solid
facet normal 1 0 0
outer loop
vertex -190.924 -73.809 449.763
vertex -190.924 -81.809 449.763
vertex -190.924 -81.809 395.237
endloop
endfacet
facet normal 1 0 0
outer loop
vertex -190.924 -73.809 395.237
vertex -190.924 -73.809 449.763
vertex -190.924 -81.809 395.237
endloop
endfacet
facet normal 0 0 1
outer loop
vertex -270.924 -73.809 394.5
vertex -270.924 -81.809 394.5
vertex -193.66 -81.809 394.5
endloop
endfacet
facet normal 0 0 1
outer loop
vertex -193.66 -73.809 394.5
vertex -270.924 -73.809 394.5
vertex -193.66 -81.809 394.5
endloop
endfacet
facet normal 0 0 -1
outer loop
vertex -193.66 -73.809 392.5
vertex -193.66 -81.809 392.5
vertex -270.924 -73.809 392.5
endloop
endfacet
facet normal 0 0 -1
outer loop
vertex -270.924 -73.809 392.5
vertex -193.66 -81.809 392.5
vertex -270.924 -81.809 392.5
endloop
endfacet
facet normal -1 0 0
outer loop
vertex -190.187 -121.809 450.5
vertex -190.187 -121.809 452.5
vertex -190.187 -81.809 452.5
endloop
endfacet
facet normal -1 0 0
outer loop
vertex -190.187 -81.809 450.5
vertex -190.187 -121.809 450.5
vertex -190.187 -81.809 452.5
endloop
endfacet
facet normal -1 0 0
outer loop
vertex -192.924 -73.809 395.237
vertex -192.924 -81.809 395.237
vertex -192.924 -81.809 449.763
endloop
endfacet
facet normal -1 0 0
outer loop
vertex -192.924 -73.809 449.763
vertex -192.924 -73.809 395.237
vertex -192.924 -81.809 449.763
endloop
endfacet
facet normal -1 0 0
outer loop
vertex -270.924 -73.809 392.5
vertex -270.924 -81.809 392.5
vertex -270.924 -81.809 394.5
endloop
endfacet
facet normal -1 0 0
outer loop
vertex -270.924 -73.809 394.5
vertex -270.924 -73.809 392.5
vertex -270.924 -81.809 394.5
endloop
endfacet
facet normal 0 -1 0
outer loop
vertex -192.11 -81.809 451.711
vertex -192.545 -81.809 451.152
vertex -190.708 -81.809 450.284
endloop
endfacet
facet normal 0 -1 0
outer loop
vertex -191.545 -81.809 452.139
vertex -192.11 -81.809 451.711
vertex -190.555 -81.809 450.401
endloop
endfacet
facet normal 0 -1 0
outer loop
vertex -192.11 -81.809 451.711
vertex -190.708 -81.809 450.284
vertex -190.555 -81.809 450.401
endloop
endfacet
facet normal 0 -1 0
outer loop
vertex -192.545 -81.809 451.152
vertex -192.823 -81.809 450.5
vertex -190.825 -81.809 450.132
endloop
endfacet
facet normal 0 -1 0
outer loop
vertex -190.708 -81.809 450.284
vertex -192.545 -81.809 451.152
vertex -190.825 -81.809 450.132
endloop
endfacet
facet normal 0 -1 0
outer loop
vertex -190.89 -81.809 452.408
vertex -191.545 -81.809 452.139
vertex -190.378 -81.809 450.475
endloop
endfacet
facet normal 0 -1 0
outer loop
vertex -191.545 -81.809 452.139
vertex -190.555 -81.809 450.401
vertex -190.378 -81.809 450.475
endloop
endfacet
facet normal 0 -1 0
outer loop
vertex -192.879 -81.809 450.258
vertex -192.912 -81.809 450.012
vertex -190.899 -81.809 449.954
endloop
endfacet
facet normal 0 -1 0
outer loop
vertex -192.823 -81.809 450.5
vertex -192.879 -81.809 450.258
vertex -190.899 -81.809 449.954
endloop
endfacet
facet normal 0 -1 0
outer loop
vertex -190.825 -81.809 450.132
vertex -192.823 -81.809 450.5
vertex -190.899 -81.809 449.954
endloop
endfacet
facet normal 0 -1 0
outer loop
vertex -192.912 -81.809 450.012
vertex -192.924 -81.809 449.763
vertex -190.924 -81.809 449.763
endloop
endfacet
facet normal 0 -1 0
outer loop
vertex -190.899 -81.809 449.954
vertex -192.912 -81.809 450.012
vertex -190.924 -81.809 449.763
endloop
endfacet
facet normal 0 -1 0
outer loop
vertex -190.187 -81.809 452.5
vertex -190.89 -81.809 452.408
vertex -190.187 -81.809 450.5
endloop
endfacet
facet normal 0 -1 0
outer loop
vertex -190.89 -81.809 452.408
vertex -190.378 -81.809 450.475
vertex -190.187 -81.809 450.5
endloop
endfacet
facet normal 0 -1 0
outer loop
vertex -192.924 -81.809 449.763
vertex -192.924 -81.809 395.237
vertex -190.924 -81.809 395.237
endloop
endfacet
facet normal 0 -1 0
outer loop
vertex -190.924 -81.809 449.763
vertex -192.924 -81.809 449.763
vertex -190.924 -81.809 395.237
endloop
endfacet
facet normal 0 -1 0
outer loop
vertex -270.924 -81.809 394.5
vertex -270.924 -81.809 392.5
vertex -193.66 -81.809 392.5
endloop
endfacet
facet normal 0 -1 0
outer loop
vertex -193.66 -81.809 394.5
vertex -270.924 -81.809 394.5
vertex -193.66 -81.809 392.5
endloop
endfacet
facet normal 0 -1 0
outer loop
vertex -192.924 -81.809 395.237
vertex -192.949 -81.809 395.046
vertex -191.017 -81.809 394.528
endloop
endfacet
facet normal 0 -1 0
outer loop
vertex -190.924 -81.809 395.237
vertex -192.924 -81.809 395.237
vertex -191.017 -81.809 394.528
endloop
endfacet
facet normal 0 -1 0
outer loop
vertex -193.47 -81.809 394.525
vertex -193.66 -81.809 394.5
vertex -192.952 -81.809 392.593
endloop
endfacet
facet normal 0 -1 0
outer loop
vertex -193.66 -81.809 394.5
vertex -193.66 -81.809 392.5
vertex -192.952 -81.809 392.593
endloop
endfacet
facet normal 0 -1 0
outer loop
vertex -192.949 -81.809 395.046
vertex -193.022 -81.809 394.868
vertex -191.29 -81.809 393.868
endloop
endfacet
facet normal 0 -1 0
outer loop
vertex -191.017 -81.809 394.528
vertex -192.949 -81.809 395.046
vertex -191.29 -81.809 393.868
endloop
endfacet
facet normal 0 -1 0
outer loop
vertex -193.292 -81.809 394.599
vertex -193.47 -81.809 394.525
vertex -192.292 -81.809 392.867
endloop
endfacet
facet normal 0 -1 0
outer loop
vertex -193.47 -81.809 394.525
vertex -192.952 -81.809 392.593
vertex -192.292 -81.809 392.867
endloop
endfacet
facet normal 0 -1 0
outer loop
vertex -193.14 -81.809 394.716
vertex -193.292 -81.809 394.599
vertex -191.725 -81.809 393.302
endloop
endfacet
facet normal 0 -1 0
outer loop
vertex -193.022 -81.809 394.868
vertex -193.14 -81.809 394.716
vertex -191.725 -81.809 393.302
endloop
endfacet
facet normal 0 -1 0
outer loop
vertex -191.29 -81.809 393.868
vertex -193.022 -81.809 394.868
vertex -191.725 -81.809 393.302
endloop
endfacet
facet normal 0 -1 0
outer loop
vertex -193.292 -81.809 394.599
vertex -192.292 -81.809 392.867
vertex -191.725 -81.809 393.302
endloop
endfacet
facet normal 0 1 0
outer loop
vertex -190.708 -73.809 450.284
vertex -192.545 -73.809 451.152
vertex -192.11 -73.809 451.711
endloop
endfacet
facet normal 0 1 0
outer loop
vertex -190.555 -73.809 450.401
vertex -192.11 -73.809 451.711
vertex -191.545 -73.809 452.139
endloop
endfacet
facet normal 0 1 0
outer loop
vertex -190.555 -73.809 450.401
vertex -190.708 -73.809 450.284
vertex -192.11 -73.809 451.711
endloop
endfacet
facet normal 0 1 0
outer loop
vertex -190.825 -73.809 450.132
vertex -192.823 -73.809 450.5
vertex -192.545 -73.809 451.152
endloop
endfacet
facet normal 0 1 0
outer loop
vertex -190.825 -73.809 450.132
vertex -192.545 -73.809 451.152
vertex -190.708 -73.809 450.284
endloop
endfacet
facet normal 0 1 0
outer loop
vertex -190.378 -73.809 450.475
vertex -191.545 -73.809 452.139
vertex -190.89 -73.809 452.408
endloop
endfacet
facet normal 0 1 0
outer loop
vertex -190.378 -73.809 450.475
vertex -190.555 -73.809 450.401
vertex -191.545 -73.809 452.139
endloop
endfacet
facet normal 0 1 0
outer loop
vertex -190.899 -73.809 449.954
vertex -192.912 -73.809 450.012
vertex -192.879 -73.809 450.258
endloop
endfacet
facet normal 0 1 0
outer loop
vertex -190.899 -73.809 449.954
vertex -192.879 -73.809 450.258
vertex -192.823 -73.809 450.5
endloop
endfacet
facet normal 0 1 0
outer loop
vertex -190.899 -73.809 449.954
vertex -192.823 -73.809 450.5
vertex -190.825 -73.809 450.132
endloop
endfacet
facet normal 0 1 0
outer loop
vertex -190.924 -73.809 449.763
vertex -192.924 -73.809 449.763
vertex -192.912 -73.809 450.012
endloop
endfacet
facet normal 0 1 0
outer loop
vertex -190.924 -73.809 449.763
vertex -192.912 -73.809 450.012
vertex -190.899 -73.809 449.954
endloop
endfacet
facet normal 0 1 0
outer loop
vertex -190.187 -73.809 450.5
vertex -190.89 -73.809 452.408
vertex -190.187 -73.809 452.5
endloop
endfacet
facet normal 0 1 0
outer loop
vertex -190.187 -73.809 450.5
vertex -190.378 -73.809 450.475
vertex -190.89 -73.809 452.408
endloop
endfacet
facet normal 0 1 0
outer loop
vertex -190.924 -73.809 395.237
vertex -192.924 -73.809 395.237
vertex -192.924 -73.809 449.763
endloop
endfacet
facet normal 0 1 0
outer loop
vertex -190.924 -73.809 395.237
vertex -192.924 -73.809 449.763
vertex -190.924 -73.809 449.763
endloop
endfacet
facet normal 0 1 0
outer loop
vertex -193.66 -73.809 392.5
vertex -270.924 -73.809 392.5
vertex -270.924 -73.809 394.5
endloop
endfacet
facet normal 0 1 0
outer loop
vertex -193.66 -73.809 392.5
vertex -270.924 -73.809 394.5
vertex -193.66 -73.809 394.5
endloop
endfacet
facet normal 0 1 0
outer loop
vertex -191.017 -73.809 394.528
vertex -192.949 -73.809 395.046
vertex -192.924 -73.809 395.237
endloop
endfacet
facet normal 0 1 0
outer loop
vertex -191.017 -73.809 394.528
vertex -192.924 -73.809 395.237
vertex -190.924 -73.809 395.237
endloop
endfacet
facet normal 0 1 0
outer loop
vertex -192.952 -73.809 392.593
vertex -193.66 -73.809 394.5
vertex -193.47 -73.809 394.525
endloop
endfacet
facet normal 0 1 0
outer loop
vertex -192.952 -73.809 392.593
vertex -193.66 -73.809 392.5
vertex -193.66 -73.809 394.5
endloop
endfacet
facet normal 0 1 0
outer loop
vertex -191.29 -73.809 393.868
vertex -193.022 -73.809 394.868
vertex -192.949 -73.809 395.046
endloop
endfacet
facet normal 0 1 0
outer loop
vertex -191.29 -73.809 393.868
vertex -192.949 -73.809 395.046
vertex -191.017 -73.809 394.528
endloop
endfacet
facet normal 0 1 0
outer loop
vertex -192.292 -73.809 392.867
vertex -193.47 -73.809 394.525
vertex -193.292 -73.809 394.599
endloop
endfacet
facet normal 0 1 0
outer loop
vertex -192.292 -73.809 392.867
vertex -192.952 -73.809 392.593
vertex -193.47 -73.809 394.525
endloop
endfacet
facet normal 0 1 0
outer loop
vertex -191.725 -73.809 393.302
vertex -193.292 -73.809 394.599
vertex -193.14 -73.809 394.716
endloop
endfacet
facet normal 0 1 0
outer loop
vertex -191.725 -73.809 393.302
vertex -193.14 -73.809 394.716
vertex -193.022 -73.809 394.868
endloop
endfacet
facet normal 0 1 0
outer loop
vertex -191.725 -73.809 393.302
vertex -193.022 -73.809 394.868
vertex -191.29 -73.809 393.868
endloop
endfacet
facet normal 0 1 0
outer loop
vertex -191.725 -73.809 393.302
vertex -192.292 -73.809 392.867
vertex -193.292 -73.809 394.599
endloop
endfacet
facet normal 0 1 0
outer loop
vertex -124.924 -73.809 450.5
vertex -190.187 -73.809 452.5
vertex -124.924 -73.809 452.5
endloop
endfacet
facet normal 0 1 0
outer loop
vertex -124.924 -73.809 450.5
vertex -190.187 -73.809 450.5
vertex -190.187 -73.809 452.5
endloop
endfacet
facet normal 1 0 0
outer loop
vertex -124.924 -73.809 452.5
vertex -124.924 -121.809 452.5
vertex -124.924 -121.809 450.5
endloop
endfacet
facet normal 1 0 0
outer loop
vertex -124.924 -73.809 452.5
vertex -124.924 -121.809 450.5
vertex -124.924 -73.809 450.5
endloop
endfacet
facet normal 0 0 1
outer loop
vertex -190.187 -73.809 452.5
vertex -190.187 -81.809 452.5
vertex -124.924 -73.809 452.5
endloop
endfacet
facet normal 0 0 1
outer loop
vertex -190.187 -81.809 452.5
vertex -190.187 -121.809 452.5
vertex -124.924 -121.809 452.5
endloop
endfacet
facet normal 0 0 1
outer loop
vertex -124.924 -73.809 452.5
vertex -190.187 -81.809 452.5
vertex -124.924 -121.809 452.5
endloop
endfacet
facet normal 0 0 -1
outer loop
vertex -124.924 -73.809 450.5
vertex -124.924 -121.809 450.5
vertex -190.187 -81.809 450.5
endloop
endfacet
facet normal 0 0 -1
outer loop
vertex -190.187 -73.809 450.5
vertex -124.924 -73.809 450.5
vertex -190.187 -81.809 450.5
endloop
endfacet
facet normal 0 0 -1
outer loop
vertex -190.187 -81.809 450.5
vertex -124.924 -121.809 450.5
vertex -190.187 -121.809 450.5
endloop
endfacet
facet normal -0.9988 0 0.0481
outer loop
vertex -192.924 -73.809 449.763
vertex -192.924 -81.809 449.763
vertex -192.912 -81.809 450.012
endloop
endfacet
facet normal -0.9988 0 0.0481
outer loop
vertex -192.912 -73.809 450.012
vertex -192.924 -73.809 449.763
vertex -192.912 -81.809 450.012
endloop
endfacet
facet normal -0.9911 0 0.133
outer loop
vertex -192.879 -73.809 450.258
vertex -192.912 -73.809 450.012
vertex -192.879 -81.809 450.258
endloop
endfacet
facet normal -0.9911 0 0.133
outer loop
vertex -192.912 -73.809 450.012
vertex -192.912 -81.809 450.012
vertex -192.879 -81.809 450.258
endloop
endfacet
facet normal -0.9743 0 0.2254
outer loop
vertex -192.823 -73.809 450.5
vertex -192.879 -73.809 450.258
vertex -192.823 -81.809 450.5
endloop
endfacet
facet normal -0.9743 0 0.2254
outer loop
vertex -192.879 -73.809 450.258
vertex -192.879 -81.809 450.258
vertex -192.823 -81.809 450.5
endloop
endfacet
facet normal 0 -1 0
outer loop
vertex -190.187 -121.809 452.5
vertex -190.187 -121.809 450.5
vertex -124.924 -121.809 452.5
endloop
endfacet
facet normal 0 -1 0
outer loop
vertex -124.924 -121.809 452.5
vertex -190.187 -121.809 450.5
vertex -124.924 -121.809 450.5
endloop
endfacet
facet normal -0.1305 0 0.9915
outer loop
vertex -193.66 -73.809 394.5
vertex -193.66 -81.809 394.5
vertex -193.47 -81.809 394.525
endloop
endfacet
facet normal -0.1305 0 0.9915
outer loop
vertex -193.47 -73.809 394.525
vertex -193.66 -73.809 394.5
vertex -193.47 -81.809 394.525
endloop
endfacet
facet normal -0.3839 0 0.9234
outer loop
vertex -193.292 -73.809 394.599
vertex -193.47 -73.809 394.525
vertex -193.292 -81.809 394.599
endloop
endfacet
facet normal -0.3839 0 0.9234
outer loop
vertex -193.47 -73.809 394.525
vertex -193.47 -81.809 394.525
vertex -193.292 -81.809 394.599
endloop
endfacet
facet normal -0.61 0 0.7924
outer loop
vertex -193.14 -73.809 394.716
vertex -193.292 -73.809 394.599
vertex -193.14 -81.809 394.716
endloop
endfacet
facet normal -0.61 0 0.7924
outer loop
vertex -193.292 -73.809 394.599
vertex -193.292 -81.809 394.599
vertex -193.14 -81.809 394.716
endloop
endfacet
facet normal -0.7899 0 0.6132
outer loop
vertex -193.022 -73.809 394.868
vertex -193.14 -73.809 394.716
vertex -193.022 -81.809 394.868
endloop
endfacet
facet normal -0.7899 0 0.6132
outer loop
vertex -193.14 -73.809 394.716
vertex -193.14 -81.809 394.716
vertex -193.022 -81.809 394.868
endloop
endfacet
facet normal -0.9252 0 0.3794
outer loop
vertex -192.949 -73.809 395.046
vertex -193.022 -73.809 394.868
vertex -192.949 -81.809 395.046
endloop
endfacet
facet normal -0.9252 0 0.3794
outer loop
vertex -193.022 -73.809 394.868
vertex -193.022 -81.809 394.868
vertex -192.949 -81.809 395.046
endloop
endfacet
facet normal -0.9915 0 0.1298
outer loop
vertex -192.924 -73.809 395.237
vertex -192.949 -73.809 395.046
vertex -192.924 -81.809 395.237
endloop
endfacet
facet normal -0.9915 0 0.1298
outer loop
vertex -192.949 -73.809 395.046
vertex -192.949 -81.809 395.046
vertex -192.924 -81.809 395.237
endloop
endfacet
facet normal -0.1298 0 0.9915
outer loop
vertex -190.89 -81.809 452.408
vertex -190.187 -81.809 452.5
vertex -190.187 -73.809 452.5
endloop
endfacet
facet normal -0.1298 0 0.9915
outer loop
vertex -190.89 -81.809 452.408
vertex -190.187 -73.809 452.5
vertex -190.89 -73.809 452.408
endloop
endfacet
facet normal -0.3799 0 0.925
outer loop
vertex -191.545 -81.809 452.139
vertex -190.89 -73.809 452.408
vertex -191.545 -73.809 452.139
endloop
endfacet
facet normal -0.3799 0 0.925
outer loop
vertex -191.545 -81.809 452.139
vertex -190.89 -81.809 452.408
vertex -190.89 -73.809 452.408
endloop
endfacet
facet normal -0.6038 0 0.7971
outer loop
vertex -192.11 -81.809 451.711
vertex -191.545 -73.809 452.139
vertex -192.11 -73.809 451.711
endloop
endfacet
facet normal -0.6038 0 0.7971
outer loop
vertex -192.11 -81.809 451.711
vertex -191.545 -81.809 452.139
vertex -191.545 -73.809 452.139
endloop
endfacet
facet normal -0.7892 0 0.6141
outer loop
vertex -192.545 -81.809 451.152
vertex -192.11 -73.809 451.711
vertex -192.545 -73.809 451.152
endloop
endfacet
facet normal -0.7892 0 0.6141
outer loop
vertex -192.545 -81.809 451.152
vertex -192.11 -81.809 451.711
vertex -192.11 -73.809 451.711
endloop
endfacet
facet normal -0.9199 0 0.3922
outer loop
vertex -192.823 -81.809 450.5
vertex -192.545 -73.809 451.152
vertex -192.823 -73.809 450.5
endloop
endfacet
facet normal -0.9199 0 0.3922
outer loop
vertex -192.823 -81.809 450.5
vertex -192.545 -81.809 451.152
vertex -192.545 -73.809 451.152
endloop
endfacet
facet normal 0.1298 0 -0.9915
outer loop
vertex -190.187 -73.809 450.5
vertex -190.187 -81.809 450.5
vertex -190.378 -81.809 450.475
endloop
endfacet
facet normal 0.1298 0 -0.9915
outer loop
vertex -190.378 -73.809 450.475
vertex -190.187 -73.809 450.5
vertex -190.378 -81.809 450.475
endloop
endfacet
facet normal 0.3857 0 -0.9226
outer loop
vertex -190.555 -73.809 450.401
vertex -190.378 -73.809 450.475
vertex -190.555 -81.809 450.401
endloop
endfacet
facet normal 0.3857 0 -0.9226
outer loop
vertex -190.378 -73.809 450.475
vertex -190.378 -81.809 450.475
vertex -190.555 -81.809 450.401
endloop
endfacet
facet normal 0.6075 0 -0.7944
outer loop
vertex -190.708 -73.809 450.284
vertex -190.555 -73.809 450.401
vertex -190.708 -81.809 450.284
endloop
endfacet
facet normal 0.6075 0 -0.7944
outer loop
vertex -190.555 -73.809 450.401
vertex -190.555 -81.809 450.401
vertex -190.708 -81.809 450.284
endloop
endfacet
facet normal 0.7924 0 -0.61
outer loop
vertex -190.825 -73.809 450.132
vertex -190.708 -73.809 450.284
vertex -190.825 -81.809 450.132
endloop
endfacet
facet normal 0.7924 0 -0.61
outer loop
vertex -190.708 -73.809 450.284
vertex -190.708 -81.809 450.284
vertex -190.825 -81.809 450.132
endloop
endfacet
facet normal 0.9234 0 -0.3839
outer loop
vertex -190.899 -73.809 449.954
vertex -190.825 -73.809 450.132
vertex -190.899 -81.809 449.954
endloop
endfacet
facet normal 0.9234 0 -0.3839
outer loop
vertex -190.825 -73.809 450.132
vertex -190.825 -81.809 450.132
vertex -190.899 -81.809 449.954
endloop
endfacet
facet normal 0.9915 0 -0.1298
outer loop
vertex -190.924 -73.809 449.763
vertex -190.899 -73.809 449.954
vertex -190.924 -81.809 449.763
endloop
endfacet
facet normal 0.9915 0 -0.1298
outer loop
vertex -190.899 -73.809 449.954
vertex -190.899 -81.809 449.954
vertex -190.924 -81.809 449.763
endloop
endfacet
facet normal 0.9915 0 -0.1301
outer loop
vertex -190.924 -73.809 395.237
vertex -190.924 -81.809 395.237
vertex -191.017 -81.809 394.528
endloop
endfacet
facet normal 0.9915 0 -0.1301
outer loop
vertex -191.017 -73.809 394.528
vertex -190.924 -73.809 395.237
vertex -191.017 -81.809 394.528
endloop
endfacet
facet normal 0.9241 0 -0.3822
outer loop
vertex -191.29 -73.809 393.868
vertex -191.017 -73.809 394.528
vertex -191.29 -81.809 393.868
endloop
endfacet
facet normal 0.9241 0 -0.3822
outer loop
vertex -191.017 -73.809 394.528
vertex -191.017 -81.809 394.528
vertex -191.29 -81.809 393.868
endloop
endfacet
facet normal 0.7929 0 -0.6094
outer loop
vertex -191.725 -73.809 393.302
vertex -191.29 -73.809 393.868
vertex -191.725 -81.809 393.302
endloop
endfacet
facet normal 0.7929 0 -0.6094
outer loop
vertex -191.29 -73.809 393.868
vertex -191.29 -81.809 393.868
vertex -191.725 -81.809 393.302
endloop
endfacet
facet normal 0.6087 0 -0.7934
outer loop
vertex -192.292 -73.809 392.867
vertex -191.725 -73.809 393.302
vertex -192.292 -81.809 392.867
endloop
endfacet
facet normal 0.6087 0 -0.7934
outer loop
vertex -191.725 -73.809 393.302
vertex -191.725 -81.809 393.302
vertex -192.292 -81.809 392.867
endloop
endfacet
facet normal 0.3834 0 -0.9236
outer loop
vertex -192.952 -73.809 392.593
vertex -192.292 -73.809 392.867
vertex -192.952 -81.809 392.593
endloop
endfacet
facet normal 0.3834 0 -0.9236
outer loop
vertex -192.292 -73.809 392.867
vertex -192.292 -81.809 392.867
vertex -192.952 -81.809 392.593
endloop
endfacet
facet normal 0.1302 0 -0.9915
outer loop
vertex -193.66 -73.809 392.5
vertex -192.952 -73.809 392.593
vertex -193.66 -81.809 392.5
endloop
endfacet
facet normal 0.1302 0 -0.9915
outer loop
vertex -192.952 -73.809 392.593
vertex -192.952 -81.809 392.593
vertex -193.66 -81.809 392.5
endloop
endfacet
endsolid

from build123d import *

# Parameters (mm, degrees)
CROQUIS1_W                       = 68
CROQUIS1_H                       = 48
BRIDA_BASE1_DEPTH                = 2
BRIDA_DE_ARISTA1_STRIP_W         = 9.4732
BRIDA_DE_ARISTA1_STRIP_H         = 2
BRIDA_DE_ARISTA1_STRIP_CUT_DEPTH = 48
BRIDA_DE_ARISTA1_DEPTH           = 48
BRIDA_DE_ARISTA2_STRIP_W         = 9.4732
BRIDA_DE_ARISTA2_STRIP_H         = 2
BRIDA_DE_ARISTA2_STRIP_CUT_DEPTH = 48
BRIDA_DE_ARISTA2_DEPTH           = 48
DESDOBLAR1_START                 = -121.8089982
DESDOBLAR1_DEPTH                 = 48
DESDOBLAR1_2_DEPTH               = 48
CROQUIS12_W                      = 137.245889802
CROQUIS12_H                      = 40
CORTAR_EXTRUIR1_DEPTH            = 2
DOBLAR1_START                    = -81.8089982
DOBLAR1_DEPTH                    = 8
DOBLAR1_2_DEPTH                  = 8


# Read off the part's stored shape, not the designer's step: Desdoblar1, Doblar1
# Sheet-metal steps are written as plain solids
with BuildPart() as part:
    # Croquis1 → Brida base1 (new body)
    with BuildSketch(Plane.XY.offset(452.5)):
        with Locations((-158.923759138, -97.8089982)):
            Rectangle(CROQUIS1_W, CROQUIS1_H)
    extrude(amount=-BRIDA_BASE1_DEPTH)

    # Brida de arista1 strip (across the edge) → Brida de arista1 strip cut (cut)
    with BuildSketch(Plane(origin=(-192.923759138, -121.8089982, 450.5), x_dir=(1, 0, 0), z_dir=(0, 1, 0))):
        with Locations((-2, -1)):
            Rectangle(BRIDA_DE_ARISTA1_STRIP_W, BRIDA_DE_ARISTA1_STRIP_H)
    extrude(amount=BRIDA_DE_ARISTA1_STRIP_CUT_DEPTH, mode=Mode.SUBTRACT)

    # Brida de arista1 section (across the edge) → Brida de arista1 (add)
    with BuildSketch(Plane(origin=(-192.923759138, -121.8089982, 450.5), x_dir=(1, 0, 0), z_dir=(0, 1, 0))):
        with BuildLine():
            Line((0, 0.7366), (0, 58))
            Line((0, 58), (2, 58))
            Line((2, 58), (2, 0.7366))
            ThreePointArc((2, 0.7366), (2.215745145, 0.215745145), (2.7366, 0))
            Line((2.7366, 0), (2.7366, -2))
            ThreePointArc((2.7366, -2), (0.801531583, -1.198468417), (0, 0.7366))
        make_face()
    extrude(amount=BRIDA_DE_ARISTA1_DEPTH)

    # Brida de arista2 strip (across the edge) → Brida de arista2 strip cut (cut)
    with BuildSketch(Plane(origin=(-192.923759138, -73.8089982, 392.5), x_dir=(0, 0, 1), z_dir=(0, -1, 0))):
        with Locations((-2, -1)):
            Rectangle(BRIDA_DE_ARISTA2_STRIP_W, BRIDA_DE_ARISTA2_STRIP_H)
    extrude(amount=BRIDA_DE_ARISTA2_STRIP_CUT_DEPTH, mode=Mode.SUBTRACT)

    # Brida de arista2 section (across the edge) → Brida de arista2 (add)
    with BuildSketch(Plane(origin=(-192.923759138, -73.8089982, 392.5), x_dir=(0, 0, 1), z_dir=(0, -1, 0))):
        with BuildLine():
            Line((0, 0.7366), (0, 78))
            Line((0, 78), (2, 78))
            Line((2, 78), (2, 0.7366))
            ThreePointArc((2, 0.7366), (2.215745145, 0.215745145), (2.7366, 0))
            Line((2.7366, 0), (2.7366, -2))
            ThreePointArc((2.7366, -2), (0.801531583, -1.198468417), (0, 0.7366))
        make_face()
    extrude(amount=BRIDA_DE_ARISTA2_DEPTH)

    # Desdoblar1 outline → Desdoblar1 (cut)
    with BuildSketch(Plane(origin=(0, 0, 0), x_dir=(1, 0, 0), z_dir=(0, 1, 0)).offset(DESDOBLAR1_START)):
        with BuildLine():
            ThreePointArc((-192.923759138, -449.7634), (-192.898392168, -450.135145906), (-192.822761536, -450.5))
            Line((-192.822761536, -450.5), (-190.187159138, -450.5))
            ThreePointArc((-190.187159138, -450.5), (-190.708013993, -450.284254855), (-190.923759138, -449.7634))
            Line((-190.923759138, -449.7634), (-190.923759138, -395.2366))
            ThreePointArc((-190.923759138, -395.2366), (-191.725290721, -393.301531583), (-193.660359138, -392.5))
            Line((-193.660359138, -392.5), (-270.923759138, -392.5))
            Line((-270.923759138, -392.5), (-270.923759138, -394.5))
            Line((-270.923759138, -394.5), (-193.660359138, -394.5))
            ThreePointArc((-193.660359138, -394.5), (-193.139504283, -394.715745145), (-192.923759138, -395.2366))
            Line((-192.923759138, -395.2366), (-192.923759138, -449.7634))
        make_face()
    extrude(amount=DESDOBLAR1_DEPTH, mode=Mode.SUBTRACT)

    # Desdoblar1 2 outline → Desdoblar1 2 (add)
    with BuildSketch(Plane(origin=(0, 0, 0), x_dir=(1, 0, 0), z_dir=(0, 1, 0)).offset(DESDOBLAR1_START)):
        with BuildLine():
            Line((-327.43304894, -452.5), (-190.187159138, -452.5))
            ThreePointArc((-190.187159138, -452.5), (-191.841426347, -451.943395312), (-192.822761536, -450.5))
            Line((-192.822761536, -450.5), (-327.43304894, -450.5))
            Line((-327.43304894, -450.5), (-327.43304894, -452.5))
        make_face()
    extrude(amount=DESDOBLAR1_2_DEPTH)

    # Croquis12 → Cortar-Extruir1 (cut)
    with BuildSketch(Plane.XY.offset(452.5)):
        with Locations((-258.810104039, -101.8089982)):
            Rectangle(CROQUIS12_W, CROQUIS12_H)
    extrude(amount=-CORTAR_EXTRUIR1_DEPTH, mode=Mode.SUBTRACT)

    # Doblar1 outline → Doblar1 (cut)
    with BuildSketch(Plane(origin=(0, 0, 0), x_dir=(1, 0, 0), z_dir=(0, 1, 0)).offset(DOBLAR1_START)):
        with BuildLine():
            ThreePointArc((-190.187159138, -452.5), (-191.841426347, -451.943395312), (-192.822761536, -450.5))
            Line((-192.822761536, -450.5), (-327.43304894, -450.5))
            Line((-327.43304894, -450.5), (-327.43304894, -452.5))
            Line((-327.43304894, -452.5), (-190.187159138, -452.5))
        make_face()
    extrude(amount=DOBLAR1_DEPTH, mode=Mode.SUBTRACT)

    # Doblar1 2 outline → Doblar1 2 (add)
    with BuildSketch(Plane(origin=(0, 0, 0), x_dir=(1, 0, 0), z_dir=(0, 1, 0)).offset(DOBLAR1_START)):
        with BuildLine():
            Line((-192.923759138, -395.2366), (-192.923759138, -449.7634))
            ThreePointArc((-192.923759138, -449.7634), (-192.898392168, -450.135145906), (-192.822761536, -450.5))
            Line((-192.822761536, -450.5), (-190.187159138, -450.5))
            ThreePointArc((-190.187159138, -450.5), (-190.708013993, -450.284254855), (-190.923759138, -449.7634))
            Line((-190.923759138, -449.7634), (-190.923759138, -395.2366))
            ThreePointArc((-190.923759138, -395.2366), (-191.725290721, -393.301531583), (-193.660359138, -392.5))
            Line((-193.660359138, -392.5), (-270.923759138, -392.5))
            Line((-270.923759138, -392.5), (-270.923759138, -394.5))
            Line((-270.923759138, -394.5), (-193.660359138, -394.5))
            ThreePointArc((-193.660359138, -394.5), (-193.139504283, -394.715745145), (-192.923759138, -395.2366))
        make_face()
    extrude(amount=DOBLAR1_2_DEPTH)


solid = part.part
